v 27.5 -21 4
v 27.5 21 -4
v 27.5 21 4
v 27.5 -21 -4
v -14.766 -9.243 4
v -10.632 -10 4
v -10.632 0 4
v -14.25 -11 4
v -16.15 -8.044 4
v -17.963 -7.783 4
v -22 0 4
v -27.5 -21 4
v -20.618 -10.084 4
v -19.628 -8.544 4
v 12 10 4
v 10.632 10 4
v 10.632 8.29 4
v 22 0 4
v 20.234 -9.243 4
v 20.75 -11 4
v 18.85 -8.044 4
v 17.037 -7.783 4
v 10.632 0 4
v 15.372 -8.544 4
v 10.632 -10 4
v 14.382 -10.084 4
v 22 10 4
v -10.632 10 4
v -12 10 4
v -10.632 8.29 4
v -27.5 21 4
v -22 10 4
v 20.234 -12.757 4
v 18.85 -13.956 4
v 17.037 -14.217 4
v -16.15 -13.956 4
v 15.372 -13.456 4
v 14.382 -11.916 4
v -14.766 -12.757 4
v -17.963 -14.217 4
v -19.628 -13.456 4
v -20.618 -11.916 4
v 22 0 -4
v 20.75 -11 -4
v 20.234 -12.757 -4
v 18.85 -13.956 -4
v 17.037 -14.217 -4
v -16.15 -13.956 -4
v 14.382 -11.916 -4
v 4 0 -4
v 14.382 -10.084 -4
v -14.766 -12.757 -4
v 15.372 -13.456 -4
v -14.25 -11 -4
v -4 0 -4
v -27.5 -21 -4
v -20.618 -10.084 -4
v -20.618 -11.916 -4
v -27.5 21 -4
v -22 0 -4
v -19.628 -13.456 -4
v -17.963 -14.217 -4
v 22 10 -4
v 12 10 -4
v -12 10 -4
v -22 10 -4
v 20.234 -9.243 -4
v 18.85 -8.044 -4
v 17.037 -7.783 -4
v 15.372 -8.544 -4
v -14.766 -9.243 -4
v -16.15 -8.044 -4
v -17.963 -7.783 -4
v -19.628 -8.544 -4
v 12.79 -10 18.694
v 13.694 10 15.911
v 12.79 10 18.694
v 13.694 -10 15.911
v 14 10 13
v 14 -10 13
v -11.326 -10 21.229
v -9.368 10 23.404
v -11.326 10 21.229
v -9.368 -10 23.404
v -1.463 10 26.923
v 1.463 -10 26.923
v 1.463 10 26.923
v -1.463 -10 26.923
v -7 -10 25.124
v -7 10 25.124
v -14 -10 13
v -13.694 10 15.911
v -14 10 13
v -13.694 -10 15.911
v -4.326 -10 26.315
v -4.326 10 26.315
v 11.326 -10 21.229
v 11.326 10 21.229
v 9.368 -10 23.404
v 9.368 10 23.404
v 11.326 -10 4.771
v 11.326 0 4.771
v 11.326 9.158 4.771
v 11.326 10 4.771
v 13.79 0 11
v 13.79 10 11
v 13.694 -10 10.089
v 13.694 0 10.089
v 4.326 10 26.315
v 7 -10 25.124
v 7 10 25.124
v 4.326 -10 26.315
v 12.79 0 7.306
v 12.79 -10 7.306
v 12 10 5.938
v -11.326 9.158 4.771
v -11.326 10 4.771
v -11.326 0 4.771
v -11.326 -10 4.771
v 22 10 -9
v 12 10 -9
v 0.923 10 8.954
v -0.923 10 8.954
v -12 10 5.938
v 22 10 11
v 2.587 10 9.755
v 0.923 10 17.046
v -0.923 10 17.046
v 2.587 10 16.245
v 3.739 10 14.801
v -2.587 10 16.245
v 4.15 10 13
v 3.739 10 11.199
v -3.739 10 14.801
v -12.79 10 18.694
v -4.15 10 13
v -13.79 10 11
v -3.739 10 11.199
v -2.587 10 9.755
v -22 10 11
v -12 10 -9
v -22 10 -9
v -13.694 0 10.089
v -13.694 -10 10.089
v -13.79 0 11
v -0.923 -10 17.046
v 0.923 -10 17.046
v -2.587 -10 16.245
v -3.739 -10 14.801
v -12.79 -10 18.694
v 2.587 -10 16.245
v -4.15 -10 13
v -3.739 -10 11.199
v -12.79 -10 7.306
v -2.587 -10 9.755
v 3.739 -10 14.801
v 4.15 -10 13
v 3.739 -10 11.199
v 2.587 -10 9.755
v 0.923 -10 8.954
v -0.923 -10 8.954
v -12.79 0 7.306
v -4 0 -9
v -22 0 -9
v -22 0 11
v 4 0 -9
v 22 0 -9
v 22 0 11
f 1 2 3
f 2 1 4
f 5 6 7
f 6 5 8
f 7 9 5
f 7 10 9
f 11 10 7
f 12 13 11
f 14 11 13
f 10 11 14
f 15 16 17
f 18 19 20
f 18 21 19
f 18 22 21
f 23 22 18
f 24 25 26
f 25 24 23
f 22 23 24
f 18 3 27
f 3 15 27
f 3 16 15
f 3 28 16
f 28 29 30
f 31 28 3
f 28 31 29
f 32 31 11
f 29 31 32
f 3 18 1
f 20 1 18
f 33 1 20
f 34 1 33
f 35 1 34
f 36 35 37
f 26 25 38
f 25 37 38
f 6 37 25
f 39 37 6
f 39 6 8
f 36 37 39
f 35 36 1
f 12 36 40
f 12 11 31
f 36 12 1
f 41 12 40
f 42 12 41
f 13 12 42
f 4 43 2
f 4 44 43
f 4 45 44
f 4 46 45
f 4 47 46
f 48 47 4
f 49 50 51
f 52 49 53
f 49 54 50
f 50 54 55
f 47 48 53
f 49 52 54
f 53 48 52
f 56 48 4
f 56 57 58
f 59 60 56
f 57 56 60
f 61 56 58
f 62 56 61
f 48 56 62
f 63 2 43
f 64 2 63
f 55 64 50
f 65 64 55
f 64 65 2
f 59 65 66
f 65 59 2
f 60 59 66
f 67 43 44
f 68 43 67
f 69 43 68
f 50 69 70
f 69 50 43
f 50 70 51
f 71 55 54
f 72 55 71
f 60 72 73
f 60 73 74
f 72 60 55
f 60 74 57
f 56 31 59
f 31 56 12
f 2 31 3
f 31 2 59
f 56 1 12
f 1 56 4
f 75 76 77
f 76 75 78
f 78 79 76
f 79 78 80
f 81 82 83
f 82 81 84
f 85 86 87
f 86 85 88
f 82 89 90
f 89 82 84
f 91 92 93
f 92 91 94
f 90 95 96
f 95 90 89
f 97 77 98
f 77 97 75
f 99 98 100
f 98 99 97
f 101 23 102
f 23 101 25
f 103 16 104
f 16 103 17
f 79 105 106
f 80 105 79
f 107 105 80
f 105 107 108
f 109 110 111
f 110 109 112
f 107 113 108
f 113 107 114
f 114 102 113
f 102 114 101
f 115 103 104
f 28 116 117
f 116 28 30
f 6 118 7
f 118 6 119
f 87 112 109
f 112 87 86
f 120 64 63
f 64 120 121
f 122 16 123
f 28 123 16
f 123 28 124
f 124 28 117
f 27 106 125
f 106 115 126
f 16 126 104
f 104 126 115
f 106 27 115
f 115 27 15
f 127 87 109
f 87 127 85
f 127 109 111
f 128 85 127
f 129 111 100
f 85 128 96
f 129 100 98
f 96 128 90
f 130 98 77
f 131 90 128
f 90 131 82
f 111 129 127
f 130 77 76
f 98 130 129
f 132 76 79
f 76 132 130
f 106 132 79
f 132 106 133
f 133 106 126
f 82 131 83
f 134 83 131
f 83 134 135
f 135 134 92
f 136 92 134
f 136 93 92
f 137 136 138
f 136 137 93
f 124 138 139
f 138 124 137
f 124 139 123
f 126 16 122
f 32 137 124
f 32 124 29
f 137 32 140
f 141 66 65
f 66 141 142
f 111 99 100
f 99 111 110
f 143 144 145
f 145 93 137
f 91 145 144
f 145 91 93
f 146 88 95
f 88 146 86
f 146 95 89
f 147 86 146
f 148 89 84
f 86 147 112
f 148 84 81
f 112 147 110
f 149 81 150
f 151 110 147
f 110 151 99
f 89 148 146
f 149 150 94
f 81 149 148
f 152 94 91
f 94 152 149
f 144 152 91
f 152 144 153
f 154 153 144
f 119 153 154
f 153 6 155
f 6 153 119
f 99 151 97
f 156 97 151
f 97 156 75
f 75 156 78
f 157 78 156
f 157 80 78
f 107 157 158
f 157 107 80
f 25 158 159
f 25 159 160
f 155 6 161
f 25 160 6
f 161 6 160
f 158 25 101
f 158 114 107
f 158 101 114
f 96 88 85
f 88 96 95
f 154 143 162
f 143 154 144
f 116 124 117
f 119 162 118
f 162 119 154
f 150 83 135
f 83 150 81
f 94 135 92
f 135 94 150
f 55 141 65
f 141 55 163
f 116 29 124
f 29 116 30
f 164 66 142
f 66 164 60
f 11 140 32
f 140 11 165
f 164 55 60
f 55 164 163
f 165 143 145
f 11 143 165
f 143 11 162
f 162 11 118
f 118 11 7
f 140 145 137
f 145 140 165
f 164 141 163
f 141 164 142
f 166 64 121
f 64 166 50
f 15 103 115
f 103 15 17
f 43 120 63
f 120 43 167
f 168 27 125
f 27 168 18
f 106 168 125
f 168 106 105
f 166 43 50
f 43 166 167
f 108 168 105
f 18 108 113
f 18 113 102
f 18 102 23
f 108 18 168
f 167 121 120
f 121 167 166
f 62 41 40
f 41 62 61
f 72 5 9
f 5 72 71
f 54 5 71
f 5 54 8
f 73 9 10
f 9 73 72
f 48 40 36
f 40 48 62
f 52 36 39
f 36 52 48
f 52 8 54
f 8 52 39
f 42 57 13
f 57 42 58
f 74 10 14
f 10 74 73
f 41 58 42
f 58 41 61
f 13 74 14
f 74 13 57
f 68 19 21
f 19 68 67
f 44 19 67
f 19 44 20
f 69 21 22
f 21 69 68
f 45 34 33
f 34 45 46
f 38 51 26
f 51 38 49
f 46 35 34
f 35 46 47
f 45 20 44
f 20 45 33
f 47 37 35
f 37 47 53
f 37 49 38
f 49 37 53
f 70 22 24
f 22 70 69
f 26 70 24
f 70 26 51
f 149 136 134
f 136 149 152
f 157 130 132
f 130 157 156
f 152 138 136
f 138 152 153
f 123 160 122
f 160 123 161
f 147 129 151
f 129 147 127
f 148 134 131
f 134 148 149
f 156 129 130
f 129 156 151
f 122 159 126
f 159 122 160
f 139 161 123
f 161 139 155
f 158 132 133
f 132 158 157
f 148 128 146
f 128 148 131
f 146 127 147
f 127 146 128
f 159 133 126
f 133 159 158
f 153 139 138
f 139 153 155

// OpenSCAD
// Parameters
shaft_diameter_mm = 8; //[4:16:0.1]
shaft_clearance_mm = 0.3; //[0:1:0.05]
base_length_mm = 55; //[30:110:0.5]
base_width_mm = 42; //[21:84:0.5]
base_thickness_mm = 8; //[4:16:0.5]
overall_height_mm = 28; //[14:56:0.5]
housing_outer_diameter_mm = 28; //[16:56:0.5]
housing_length_mm = 20; //[10:40:0.5]
mount_hole_diameter_mm = 6.5; //[3:10:0.1]
mount_hole_edge_margin_x_mm = 10; //[5:20:0.5]
mount_hole_offset_y_mm = 10; //[6:18:0.5]
mount_hole_spacing_mm = 35; //[20:80:0.5]
fillet_radius_mm = 1; //[0:3:0.25]
trapezoid_height_mm = 10; //[5:20:0.5]
trapezoid_base_x_mm = 18; //[10:30:0.5]
trapezoid_top_x_mm = 10; //[6:24:0.5]
overlap_mm = 1; //[0.5:2:0.1]

// Right Trapezoid
module right_trapezoid() {
  color("Silver") {
    linear_extrude(height=housing_length_mm, center=true) {
      polygon(points=[
        [0, 0],
        [trapezoid_base_x_mm, 0],
        [trapezoid_top_x_mm, trapezoid_height_mm],
        [0, trapezoid_height_mm]
      ]);
    }
  }
}

// KP Pillow Block Hole Positions
module kp_pillow_block_hole_positions() {
  color("DimGray") {
    translate([-mount_hole_spacing_mm/2, -base_width_mm/2 + mount_hole_offset_y_mm, 0])
      cylinder(r=mount_hole_diameter_mm/2, h=base_thickness_mm + 2*overlap_mm, center=true);
    translate([mount_hole_spacing_mm/2, -base_width_mm/2 + mount_hole_offset_y_mm, 0])
      cylinder(r=mount_hole_diameter_mm/2, h=base_thickness_mm + 2*overlap_mm, center=true);
  }
}

// KP Pillow Block
module kp_pillow_block() {
  color("Black") {
    difference() {
      union() {
        translate([0, 0, 0])
          cube([base_length_mm, base_width_mm, base_thickness_mm], center=true);
        translate([0, 0, base_thickness_mm/2 + (overall_height_mm - base_thickness_mm)/2 - overlap_mm])
          rotate([90, 0, 0])
          cylinder(r=housing_outer_diameter_mm/2, h=housing_length_mm, center=true);
        translate([-housing_outer_diameter_mm/2 - trapezoid_base_x_mm/2 + overlap_mm, 0, -base_thickness_mm/2 + trapezoid_height_mm/2])
          right_trapezoid();
        mirror([1, 0, 0])
          translate([-housing_outer_diameter_mm/2 - trapezoid_base_x_mm/2 + overlap_mm, 0, -base_thickness_mm/2 + trapezoid_height_mm/2])
          right_trapezoid();
      }
      kp_pillow_block_hole_positions();
      translate([0, 0, base_thickness_mm/2 + (overall_height_mm - base_thickness_mm)/2 - overlap_mm])
        rotate([90, 0, 0])
        cylinder(r=(shaft_diameter_mm + shaft_clearance_mm)/2, h=housing_length_mm + 2*overlap_mm, center=true);
    }
  }
}

// KP Pillow Block Assembly
module kp_pillow_block_assembly() {
  color("Silver") {
    kp_pillow_block();
  }
}

// SCS Bearing Block Assembly
module scs_bearing_block_assembly() {
  // Placeholder for SCS Bearing Block Assembly
  // Add detailed geometry here if needed
}

// Final Assembly
module assembly() {
  kp_pillow_block_assembly();
  scs_bearing_block_assembly();
}

assembly();
